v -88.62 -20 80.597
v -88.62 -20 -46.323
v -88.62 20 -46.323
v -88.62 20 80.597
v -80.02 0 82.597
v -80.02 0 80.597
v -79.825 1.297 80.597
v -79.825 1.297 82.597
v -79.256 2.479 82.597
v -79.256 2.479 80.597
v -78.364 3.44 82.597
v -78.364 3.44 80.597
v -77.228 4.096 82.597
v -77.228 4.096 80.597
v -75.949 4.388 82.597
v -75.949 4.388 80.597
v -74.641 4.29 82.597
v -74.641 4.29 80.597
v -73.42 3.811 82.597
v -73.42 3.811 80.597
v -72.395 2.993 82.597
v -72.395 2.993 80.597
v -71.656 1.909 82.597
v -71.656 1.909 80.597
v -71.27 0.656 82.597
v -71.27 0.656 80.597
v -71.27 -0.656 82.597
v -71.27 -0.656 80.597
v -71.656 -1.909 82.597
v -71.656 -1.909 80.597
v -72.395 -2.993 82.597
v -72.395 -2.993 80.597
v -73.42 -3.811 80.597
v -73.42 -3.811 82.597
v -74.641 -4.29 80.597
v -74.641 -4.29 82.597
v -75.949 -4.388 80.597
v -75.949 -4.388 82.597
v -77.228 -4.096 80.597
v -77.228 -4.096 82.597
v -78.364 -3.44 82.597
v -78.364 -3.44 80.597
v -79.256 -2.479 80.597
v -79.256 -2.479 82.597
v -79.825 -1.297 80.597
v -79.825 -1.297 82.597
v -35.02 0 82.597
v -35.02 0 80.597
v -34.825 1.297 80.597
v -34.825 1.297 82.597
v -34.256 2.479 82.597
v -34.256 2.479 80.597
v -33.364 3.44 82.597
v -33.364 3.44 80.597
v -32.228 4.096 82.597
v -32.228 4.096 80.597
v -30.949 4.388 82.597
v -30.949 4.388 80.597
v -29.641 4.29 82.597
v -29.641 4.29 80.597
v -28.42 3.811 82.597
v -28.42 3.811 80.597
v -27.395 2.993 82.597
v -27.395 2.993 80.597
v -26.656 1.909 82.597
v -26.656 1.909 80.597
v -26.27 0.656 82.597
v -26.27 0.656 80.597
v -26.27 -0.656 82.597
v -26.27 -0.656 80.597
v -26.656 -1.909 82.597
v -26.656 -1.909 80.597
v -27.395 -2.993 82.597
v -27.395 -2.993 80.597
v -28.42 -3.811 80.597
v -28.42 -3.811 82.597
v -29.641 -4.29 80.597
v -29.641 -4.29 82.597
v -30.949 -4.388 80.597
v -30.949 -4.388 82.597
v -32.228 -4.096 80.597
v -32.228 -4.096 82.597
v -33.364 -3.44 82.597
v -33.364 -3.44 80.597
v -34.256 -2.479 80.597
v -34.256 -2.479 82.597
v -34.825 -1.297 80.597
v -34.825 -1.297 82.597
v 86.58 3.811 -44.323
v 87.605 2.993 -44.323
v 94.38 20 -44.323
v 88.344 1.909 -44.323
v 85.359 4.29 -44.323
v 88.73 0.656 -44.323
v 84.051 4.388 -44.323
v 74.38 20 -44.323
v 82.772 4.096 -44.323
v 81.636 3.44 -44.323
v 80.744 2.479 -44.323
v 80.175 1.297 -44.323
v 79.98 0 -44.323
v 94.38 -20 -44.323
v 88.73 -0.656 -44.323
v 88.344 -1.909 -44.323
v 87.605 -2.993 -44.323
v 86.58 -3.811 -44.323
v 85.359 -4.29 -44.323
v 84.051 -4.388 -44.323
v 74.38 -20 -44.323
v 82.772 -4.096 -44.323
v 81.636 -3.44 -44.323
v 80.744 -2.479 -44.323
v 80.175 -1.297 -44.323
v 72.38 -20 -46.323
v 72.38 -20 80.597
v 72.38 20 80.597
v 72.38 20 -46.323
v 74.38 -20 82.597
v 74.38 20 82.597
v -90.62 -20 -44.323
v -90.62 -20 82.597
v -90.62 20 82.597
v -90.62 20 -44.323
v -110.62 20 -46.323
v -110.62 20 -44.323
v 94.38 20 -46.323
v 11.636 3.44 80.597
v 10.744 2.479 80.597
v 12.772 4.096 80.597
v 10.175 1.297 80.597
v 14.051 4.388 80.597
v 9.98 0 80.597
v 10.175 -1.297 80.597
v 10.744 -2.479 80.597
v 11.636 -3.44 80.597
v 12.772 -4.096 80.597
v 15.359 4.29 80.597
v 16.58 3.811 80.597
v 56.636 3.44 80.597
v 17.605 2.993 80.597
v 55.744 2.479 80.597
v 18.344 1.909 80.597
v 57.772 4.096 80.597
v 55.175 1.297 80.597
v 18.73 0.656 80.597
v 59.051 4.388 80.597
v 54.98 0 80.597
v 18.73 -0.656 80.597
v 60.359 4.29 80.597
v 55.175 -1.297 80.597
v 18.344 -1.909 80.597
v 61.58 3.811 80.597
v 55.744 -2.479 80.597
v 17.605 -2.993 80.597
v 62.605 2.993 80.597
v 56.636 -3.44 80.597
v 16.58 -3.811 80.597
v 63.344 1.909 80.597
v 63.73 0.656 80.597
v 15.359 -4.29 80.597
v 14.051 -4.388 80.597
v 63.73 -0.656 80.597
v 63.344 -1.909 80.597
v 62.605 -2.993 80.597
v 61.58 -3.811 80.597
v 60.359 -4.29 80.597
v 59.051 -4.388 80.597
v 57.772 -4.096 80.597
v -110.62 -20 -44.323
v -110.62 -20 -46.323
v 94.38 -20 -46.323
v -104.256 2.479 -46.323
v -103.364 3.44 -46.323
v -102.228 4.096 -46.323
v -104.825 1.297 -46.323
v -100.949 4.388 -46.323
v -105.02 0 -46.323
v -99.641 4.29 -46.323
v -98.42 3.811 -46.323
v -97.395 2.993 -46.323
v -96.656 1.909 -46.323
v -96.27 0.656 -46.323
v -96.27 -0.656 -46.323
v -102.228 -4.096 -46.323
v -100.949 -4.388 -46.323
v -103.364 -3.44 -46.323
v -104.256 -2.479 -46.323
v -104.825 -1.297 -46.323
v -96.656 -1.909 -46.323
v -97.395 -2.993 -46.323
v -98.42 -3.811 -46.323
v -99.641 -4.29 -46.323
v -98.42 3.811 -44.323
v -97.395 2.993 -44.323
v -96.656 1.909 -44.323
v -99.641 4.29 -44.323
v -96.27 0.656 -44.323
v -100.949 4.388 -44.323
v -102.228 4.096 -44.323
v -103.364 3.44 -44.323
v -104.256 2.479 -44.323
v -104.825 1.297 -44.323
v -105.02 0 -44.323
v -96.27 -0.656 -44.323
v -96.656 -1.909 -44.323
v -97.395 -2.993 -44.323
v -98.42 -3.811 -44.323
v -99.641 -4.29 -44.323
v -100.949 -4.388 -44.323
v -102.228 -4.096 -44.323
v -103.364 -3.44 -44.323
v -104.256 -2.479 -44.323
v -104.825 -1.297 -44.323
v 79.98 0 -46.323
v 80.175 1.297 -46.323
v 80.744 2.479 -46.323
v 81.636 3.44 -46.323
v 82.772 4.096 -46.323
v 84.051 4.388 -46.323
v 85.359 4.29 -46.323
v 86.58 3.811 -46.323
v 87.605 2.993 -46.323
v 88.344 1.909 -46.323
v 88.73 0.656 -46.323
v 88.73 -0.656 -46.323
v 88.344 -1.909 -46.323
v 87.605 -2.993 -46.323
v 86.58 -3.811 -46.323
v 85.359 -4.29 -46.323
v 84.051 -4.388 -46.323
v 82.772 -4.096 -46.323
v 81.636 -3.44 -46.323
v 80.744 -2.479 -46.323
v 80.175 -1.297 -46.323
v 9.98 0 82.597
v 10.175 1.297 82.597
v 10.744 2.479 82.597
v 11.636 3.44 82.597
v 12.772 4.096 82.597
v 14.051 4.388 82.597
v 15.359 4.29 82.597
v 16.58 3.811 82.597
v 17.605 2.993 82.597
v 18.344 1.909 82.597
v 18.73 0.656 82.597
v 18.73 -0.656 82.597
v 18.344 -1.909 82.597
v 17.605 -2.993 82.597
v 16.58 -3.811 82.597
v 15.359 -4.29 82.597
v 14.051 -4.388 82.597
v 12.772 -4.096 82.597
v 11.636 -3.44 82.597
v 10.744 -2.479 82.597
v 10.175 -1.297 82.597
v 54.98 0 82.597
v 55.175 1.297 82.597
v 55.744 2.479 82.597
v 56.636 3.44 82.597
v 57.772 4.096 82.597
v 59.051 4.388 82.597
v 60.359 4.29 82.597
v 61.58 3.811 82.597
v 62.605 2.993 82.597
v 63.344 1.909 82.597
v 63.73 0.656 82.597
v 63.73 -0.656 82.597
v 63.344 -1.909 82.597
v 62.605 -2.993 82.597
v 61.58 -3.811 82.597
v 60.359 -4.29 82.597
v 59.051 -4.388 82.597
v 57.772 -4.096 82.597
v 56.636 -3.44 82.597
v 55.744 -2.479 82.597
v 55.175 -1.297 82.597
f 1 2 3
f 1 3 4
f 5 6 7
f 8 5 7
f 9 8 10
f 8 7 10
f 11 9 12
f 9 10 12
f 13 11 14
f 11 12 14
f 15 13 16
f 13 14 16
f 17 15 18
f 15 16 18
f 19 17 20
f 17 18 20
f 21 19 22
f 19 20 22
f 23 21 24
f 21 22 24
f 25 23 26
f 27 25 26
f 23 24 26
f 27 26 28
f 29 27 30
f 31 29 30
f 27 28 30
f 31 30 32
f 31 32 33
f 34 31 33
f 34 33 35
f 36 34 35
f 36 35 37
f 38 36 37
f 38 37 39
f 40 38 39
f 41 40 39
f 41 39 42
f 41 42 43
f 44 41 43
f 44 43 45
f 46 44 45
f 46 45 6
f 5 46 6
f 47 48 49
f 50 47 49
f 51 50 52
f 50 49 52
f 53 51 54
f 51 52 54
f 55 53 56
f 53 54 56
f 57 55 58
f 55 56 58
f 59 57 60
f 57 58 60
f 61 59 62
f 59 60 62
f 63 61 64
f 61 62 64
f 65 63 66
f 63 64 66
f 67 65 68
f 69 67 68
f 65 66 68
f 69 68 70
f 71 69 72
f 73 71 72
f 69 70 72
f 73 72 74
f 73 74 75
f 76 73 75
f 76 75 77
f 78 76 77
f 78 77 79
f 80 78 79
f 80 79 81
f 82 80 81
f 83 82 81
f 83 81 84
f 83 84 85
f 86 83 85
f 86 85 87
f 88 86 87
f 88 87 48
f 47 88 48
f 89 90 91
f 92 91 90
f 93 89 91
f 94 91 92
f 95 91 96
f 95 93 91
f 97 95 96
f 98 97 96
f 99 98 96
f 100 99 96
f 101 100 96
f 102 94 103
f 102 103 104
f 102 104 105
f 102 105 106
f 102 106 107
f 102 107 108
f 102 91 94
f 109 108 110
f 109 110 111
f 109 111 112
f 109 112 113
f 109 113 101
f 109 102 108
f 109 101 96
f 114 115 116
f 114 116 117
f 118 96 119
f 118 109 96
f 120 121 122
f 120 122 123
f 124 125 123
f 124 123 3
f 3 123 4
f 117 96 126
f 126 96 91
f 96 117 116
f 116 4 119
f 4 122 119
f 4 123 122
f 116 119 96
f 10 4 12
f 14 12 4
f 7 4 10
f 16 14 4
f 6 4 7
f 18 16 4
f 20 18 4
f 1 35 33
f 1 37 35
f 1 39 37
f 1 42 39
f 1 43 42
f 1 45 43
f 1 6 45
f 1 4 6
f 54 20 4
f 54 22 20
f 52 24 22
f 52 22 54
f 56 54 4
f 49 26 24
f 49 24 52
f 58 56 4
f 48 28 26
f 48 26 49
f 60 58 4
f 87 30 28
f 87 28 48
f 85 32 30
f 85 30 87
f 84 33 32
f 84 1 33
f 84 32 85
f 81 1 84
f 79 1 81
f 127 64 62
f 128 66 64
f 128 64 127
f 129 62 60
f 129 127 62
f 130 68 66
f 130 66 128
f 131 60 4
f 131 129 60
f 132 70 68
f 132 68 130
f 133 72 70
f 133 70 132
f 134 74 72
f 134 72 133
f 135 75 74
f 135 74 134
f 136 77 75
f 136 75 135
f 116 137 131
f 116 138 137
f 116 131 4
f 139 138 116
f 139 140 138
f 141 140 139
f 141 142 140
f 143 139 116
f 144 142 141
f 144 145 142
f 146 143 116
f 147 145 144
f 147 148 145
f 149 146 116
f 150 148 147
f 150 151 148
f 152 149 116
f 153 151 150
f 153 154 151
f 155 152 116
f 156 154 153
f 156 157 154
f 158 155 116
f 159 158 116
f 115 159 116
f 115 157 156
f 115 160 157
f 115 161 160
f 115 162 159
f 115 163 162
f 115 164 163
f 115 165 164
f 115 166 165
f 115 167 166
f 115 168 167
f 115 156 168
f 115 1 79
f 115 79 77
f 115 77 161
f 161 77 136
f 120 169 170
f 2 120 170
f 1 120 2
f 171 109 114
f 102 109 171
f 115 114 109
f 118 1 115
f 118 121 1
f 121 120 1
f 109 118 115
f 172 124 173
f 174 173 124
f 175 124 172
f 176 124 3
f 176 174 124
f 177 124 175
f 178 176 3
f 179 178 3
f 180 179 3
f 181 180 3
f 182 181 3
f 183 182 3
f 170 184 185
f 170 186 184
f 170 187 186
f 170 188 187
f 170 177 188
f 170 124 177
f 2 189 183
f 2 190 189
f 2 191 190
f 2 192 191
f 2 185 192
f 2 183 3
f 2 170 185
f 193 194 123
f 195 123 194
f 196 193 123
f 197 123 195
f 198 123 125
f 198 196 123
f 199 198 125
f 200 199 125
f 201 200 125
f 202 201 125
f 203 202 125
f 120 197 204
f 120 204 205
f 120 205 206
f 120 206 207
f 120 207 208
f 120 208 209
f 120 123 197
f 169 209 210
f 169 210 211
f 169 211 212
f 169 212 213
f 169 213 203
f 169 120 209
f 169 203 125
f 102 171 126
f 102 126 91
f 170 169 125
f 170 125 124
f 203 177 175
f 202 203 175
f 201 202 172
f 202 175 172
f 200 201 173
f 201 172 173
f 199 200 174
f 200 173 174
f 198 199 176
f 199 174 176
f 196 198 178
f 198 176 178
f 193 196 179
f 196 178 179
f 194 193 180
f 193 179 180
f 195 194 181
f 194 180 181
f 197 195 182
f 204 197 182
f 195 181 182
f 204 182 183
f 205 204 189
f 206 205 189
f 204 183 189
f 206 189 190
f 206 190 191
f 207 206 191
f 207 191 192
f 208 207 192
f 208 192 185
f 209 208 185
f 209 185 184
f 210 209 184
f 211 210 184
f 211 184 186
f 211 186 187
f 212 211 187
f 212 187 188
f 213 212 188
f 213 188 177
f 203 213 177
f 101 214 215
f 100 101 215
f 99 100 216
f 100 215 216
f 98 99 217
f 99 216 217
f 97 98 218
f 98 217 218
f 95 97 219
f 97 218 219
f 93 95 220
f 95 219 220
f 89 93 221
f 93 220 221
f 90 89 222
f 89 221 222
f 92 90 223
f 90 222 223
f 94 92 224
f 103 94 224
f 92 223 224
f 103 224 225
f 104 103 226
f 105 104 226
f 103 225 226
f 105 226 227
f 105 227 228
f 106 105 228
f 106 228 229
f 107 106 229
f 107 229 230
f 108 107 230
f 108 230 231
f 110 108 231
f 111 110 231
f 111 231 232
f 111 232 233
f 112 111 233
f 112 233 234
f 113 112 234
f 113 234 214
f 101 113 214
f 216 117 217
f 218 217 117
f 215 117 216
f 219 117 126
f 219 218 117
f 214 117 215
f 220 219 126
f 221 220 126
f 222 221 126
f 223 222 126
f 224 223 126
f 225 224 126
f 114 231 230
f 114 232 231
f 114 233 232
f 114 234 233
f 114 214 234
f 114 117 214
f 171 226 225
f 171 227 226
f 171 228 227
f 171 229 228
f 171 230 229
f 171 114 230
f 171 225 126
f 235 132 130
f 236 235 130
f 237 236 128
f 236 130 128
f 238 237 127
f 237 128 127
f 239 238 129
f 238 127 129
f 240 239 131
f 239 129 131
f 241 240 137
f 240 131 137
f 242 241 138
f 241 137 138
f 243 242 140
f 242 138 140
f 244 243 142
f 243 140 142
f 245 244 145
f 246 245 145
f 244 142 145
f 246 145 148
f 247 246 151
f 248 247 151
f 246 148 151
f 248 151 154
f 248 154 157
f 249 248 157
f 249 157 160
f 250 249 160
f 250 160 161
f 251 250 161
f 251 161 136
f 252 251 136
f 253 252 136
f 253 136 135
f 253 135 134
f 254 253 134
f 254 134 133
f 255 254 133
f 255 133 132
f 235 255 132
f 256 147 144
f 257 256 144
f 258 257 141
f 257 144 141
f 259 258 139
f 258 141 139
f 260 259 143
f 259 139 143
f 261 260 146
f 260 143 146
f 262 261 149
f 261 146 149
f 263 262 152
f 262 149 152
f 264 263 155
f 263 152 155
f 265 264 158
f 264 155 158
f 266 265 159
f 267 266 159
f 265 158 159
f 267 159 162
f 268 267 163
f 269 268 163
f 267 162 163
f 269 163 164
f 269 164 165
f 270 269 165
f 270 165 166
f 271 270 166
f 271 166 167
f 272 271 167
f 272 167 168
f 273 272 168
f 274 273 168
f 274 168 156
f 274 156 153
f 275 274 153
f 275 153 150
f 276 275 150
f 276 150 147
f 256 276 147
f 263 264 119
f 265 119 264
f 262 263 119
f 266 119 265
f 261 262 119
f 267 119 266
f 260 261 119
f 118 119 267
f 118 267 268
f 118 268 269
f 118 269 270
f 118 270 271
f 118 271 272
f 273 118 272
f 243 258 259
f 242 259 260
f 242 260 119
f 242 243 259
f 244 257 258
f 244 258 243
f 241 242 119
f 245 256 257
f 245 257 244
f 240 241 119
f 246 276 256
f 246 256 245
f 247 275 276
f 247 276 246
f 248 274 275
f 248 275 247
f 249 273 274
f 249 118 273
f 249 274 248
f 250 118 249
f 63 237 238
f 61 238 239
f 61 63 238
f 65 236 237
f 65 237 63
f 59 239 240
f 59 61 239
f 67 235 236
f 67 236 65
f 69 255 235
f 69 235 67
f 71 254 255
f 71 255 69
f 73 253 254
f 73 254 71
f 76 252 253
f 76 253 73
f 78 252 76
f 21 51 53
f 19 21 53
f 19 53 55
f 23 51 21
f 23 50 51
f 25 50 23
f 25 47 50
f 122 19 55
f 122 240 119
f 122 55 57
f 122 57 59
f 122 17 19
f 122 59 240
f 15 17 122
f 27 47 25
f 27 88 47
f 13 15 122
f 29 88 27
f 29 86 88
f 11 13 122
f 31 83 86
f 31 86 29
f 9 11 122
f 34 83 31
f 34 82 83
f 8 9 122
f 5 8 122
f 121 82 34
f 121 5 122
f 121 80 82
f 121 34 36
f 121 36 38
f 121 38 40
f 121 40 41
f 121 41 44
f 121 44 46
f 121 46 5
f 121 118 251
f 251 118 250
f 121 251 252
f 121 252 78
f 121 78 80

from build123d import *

# Parameters (mm, degrees)
F1_DEPTH   = 20
F5_D       = 8.8
F5_ON_F2_D = 8.8
F5_ON_F4_D = 8.8


with BuildPart() as f1:
    # F0 (on Front) → F1 (new body, symmetric)
    with BuildSketch(Plane.XZ):
        Polygon((74.3795982003, 82.5967788231), (-90.6204017997, 82.5967788231), (-90.6204017997, -44.3232211769), (-110.6204017997, -44.3232211769), (-110.6204017997, -46.3232211769), (-88.6204017997, -46.3232211769), (-88.6204017997, 80.5967788231), (-8.1204017997, 80.5967788231), (72.3795982003, 80.5967788231), (72.3795982003, -46.3232211769), (94.3795982003, -46.3232211769), (94.3795982003, -44.3232211769), (74.3795982003, -44.3232211769), align=None)
    extrude(amount=F1_DEPTH, both=True)

    # F5 (through all)
    with Locations(Plane.XY.offset(82.5967788231)):
        with Locations((-75.6204017997, 0), (-30.6204017997, 0), (14.3795982003, 0), (59.3795982003, 0)):
            Hole(F5_D / 2)

    # F5 on F2 (through all)
    with Locations(Plane.XY.offset(-44.3232211769)):
        with Locations((-100.6204017997, 0)):
            Hole(F5_ON_F2_D / 2)

    # F5 on F4 (through all)
    with Locations(Plane.XY.offset(-44.3232211769)):
        with Locations((84.3795982003, 0)):
            Hole(F5_ON_F4_D / 2)


solid = f1.part
